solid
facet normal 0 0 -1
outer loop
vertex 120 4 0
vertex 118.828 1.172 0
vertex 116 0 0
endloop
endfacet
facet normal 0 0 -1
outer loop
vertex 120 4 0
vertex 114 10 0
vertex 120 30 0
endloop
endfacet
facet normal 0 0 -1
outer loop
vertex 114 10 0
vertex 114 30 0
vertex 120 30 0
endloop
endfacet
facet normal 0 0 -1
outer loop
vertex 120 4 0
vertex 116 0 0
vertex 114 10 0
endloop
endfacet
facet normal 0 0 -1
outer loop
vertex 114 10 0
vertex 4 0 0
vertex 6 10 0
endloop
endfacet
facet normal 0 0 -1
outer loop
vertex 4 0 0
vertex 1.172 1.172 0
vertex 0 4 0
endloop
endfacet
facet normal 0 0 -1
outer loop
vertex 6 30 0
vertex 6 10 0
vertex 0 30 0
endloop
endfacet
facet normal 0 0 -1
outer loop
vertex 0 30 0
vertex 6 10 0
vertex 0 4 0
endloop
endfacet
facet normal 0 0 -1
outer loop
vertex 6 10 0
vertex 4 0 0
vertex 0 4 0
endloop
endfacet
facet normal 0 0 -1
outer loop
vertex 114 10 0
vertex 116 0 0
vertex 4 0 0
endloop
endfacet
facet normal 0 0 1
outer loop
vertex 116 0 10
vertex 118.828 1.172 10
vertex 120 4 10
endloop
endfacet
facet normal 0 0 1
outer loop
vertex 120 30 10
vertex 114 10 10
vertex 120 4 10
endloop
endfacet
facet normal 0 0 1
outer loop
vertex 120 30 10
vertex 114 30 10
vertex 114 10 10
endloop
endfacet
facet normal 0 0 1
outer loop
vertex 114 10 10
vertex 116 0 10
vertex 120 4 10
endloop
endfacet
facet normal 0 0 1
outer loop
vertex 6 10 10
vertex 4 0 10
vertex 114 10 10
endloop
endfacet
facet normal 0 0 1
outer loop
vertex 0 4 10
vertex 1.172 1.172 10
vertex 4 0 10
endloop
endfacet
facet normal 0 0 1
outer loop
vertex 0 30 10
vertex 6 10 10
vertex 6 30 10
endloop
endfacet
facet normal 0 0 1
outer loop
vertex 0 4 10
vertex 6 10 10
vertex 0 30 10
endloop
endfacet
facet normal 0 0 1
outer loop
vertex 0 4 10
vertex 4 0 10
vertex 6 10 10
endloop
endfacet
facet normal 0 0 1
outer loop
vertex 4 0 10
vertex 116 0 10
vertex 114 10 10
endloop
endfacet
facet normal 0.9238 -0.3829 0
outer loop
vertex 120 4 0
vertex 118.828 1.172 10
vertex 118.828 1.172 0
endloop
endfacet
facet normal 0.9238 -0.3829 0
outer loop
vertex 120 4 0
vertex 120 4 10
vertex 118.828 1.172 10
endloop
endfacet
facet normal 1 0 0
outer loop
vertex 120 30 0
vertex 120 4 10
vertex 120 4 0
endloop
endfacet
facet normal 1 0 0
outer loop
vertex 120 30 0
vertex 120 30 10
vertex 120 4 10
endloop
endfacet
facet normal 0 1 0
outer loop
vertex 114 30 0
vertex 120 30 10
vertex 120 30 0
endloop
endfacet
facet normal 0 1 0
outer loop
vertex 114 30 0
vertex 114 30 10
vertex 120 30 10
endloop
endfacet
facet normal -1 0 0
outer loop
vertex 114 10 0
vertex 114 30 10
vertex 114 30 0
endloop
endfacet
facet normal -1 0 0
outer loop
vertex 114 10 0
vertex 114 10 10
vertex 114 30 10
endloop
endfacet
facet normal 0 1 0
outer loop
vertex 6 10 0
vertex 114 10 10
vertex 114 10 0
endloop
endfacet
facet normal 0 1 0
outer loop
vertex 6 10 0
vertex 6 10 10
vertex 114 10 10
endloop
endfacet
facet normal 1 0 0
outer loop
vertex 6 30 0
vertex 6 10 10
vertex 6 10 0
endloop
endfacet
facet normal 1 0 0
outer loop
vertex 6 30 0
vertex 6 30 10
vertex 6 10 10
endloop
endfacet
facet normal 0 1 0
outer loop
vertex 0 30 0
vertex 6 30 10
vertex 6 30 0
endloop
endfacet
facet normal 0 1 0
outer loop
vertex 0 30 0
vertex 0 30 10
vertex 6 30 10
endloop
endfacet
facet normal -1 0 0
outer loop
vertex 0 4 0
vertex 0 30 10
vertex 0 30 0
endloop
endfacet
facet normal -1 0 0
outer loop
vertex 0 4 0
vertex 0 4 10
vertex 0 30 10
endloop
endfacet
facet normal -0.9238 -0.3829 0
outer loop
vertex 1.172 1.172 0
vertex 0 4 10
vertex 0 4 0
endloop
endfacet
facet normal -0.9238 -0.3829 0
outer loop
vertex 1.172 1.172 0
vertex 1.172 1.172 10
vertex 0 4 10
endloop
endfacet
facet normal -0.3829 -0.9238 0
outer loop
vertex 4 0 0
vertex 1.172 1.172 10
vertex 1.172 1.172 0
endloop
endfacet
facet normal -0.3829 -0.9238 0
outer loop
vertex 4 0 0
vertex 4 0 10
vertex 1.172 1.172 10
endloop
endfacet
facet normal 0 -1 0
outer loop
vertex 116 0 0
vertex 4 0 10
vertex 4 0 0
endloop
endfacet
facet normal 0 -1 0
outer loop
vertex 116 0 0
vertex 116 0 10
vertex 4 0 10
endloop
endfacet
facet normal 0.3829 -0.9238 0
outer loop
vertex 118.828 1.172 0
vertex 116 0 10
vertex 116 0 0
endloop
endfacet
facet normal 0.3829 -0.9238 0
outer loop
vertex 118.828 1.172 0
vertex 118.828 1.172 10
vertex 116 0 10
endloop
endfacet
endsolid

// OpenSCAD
$fn = 32;

// ----------------------------------------------------------------------
// Heat sink frame: 120 x 30 mm frame, 6 mm walls
// ----------------------------------------------------------------------

// --- parameters (mm) ---
profile_height = 10;      // extrusion height
profile_points = 12;      // points of the closed outline

profile = [[0, 4], [1.172, 1.172], [4, 0], [116, 0], [118.828, 1.172], [120, 4], [120, 30], [114, 30], [114, 10], [6, 10], [6, 30], [0, 30]];  // single closed polygon, 12 points, counter clockwise

// --- the one profile operation ---
linear_extrude(height = profile_height) polygon(points = profile);
